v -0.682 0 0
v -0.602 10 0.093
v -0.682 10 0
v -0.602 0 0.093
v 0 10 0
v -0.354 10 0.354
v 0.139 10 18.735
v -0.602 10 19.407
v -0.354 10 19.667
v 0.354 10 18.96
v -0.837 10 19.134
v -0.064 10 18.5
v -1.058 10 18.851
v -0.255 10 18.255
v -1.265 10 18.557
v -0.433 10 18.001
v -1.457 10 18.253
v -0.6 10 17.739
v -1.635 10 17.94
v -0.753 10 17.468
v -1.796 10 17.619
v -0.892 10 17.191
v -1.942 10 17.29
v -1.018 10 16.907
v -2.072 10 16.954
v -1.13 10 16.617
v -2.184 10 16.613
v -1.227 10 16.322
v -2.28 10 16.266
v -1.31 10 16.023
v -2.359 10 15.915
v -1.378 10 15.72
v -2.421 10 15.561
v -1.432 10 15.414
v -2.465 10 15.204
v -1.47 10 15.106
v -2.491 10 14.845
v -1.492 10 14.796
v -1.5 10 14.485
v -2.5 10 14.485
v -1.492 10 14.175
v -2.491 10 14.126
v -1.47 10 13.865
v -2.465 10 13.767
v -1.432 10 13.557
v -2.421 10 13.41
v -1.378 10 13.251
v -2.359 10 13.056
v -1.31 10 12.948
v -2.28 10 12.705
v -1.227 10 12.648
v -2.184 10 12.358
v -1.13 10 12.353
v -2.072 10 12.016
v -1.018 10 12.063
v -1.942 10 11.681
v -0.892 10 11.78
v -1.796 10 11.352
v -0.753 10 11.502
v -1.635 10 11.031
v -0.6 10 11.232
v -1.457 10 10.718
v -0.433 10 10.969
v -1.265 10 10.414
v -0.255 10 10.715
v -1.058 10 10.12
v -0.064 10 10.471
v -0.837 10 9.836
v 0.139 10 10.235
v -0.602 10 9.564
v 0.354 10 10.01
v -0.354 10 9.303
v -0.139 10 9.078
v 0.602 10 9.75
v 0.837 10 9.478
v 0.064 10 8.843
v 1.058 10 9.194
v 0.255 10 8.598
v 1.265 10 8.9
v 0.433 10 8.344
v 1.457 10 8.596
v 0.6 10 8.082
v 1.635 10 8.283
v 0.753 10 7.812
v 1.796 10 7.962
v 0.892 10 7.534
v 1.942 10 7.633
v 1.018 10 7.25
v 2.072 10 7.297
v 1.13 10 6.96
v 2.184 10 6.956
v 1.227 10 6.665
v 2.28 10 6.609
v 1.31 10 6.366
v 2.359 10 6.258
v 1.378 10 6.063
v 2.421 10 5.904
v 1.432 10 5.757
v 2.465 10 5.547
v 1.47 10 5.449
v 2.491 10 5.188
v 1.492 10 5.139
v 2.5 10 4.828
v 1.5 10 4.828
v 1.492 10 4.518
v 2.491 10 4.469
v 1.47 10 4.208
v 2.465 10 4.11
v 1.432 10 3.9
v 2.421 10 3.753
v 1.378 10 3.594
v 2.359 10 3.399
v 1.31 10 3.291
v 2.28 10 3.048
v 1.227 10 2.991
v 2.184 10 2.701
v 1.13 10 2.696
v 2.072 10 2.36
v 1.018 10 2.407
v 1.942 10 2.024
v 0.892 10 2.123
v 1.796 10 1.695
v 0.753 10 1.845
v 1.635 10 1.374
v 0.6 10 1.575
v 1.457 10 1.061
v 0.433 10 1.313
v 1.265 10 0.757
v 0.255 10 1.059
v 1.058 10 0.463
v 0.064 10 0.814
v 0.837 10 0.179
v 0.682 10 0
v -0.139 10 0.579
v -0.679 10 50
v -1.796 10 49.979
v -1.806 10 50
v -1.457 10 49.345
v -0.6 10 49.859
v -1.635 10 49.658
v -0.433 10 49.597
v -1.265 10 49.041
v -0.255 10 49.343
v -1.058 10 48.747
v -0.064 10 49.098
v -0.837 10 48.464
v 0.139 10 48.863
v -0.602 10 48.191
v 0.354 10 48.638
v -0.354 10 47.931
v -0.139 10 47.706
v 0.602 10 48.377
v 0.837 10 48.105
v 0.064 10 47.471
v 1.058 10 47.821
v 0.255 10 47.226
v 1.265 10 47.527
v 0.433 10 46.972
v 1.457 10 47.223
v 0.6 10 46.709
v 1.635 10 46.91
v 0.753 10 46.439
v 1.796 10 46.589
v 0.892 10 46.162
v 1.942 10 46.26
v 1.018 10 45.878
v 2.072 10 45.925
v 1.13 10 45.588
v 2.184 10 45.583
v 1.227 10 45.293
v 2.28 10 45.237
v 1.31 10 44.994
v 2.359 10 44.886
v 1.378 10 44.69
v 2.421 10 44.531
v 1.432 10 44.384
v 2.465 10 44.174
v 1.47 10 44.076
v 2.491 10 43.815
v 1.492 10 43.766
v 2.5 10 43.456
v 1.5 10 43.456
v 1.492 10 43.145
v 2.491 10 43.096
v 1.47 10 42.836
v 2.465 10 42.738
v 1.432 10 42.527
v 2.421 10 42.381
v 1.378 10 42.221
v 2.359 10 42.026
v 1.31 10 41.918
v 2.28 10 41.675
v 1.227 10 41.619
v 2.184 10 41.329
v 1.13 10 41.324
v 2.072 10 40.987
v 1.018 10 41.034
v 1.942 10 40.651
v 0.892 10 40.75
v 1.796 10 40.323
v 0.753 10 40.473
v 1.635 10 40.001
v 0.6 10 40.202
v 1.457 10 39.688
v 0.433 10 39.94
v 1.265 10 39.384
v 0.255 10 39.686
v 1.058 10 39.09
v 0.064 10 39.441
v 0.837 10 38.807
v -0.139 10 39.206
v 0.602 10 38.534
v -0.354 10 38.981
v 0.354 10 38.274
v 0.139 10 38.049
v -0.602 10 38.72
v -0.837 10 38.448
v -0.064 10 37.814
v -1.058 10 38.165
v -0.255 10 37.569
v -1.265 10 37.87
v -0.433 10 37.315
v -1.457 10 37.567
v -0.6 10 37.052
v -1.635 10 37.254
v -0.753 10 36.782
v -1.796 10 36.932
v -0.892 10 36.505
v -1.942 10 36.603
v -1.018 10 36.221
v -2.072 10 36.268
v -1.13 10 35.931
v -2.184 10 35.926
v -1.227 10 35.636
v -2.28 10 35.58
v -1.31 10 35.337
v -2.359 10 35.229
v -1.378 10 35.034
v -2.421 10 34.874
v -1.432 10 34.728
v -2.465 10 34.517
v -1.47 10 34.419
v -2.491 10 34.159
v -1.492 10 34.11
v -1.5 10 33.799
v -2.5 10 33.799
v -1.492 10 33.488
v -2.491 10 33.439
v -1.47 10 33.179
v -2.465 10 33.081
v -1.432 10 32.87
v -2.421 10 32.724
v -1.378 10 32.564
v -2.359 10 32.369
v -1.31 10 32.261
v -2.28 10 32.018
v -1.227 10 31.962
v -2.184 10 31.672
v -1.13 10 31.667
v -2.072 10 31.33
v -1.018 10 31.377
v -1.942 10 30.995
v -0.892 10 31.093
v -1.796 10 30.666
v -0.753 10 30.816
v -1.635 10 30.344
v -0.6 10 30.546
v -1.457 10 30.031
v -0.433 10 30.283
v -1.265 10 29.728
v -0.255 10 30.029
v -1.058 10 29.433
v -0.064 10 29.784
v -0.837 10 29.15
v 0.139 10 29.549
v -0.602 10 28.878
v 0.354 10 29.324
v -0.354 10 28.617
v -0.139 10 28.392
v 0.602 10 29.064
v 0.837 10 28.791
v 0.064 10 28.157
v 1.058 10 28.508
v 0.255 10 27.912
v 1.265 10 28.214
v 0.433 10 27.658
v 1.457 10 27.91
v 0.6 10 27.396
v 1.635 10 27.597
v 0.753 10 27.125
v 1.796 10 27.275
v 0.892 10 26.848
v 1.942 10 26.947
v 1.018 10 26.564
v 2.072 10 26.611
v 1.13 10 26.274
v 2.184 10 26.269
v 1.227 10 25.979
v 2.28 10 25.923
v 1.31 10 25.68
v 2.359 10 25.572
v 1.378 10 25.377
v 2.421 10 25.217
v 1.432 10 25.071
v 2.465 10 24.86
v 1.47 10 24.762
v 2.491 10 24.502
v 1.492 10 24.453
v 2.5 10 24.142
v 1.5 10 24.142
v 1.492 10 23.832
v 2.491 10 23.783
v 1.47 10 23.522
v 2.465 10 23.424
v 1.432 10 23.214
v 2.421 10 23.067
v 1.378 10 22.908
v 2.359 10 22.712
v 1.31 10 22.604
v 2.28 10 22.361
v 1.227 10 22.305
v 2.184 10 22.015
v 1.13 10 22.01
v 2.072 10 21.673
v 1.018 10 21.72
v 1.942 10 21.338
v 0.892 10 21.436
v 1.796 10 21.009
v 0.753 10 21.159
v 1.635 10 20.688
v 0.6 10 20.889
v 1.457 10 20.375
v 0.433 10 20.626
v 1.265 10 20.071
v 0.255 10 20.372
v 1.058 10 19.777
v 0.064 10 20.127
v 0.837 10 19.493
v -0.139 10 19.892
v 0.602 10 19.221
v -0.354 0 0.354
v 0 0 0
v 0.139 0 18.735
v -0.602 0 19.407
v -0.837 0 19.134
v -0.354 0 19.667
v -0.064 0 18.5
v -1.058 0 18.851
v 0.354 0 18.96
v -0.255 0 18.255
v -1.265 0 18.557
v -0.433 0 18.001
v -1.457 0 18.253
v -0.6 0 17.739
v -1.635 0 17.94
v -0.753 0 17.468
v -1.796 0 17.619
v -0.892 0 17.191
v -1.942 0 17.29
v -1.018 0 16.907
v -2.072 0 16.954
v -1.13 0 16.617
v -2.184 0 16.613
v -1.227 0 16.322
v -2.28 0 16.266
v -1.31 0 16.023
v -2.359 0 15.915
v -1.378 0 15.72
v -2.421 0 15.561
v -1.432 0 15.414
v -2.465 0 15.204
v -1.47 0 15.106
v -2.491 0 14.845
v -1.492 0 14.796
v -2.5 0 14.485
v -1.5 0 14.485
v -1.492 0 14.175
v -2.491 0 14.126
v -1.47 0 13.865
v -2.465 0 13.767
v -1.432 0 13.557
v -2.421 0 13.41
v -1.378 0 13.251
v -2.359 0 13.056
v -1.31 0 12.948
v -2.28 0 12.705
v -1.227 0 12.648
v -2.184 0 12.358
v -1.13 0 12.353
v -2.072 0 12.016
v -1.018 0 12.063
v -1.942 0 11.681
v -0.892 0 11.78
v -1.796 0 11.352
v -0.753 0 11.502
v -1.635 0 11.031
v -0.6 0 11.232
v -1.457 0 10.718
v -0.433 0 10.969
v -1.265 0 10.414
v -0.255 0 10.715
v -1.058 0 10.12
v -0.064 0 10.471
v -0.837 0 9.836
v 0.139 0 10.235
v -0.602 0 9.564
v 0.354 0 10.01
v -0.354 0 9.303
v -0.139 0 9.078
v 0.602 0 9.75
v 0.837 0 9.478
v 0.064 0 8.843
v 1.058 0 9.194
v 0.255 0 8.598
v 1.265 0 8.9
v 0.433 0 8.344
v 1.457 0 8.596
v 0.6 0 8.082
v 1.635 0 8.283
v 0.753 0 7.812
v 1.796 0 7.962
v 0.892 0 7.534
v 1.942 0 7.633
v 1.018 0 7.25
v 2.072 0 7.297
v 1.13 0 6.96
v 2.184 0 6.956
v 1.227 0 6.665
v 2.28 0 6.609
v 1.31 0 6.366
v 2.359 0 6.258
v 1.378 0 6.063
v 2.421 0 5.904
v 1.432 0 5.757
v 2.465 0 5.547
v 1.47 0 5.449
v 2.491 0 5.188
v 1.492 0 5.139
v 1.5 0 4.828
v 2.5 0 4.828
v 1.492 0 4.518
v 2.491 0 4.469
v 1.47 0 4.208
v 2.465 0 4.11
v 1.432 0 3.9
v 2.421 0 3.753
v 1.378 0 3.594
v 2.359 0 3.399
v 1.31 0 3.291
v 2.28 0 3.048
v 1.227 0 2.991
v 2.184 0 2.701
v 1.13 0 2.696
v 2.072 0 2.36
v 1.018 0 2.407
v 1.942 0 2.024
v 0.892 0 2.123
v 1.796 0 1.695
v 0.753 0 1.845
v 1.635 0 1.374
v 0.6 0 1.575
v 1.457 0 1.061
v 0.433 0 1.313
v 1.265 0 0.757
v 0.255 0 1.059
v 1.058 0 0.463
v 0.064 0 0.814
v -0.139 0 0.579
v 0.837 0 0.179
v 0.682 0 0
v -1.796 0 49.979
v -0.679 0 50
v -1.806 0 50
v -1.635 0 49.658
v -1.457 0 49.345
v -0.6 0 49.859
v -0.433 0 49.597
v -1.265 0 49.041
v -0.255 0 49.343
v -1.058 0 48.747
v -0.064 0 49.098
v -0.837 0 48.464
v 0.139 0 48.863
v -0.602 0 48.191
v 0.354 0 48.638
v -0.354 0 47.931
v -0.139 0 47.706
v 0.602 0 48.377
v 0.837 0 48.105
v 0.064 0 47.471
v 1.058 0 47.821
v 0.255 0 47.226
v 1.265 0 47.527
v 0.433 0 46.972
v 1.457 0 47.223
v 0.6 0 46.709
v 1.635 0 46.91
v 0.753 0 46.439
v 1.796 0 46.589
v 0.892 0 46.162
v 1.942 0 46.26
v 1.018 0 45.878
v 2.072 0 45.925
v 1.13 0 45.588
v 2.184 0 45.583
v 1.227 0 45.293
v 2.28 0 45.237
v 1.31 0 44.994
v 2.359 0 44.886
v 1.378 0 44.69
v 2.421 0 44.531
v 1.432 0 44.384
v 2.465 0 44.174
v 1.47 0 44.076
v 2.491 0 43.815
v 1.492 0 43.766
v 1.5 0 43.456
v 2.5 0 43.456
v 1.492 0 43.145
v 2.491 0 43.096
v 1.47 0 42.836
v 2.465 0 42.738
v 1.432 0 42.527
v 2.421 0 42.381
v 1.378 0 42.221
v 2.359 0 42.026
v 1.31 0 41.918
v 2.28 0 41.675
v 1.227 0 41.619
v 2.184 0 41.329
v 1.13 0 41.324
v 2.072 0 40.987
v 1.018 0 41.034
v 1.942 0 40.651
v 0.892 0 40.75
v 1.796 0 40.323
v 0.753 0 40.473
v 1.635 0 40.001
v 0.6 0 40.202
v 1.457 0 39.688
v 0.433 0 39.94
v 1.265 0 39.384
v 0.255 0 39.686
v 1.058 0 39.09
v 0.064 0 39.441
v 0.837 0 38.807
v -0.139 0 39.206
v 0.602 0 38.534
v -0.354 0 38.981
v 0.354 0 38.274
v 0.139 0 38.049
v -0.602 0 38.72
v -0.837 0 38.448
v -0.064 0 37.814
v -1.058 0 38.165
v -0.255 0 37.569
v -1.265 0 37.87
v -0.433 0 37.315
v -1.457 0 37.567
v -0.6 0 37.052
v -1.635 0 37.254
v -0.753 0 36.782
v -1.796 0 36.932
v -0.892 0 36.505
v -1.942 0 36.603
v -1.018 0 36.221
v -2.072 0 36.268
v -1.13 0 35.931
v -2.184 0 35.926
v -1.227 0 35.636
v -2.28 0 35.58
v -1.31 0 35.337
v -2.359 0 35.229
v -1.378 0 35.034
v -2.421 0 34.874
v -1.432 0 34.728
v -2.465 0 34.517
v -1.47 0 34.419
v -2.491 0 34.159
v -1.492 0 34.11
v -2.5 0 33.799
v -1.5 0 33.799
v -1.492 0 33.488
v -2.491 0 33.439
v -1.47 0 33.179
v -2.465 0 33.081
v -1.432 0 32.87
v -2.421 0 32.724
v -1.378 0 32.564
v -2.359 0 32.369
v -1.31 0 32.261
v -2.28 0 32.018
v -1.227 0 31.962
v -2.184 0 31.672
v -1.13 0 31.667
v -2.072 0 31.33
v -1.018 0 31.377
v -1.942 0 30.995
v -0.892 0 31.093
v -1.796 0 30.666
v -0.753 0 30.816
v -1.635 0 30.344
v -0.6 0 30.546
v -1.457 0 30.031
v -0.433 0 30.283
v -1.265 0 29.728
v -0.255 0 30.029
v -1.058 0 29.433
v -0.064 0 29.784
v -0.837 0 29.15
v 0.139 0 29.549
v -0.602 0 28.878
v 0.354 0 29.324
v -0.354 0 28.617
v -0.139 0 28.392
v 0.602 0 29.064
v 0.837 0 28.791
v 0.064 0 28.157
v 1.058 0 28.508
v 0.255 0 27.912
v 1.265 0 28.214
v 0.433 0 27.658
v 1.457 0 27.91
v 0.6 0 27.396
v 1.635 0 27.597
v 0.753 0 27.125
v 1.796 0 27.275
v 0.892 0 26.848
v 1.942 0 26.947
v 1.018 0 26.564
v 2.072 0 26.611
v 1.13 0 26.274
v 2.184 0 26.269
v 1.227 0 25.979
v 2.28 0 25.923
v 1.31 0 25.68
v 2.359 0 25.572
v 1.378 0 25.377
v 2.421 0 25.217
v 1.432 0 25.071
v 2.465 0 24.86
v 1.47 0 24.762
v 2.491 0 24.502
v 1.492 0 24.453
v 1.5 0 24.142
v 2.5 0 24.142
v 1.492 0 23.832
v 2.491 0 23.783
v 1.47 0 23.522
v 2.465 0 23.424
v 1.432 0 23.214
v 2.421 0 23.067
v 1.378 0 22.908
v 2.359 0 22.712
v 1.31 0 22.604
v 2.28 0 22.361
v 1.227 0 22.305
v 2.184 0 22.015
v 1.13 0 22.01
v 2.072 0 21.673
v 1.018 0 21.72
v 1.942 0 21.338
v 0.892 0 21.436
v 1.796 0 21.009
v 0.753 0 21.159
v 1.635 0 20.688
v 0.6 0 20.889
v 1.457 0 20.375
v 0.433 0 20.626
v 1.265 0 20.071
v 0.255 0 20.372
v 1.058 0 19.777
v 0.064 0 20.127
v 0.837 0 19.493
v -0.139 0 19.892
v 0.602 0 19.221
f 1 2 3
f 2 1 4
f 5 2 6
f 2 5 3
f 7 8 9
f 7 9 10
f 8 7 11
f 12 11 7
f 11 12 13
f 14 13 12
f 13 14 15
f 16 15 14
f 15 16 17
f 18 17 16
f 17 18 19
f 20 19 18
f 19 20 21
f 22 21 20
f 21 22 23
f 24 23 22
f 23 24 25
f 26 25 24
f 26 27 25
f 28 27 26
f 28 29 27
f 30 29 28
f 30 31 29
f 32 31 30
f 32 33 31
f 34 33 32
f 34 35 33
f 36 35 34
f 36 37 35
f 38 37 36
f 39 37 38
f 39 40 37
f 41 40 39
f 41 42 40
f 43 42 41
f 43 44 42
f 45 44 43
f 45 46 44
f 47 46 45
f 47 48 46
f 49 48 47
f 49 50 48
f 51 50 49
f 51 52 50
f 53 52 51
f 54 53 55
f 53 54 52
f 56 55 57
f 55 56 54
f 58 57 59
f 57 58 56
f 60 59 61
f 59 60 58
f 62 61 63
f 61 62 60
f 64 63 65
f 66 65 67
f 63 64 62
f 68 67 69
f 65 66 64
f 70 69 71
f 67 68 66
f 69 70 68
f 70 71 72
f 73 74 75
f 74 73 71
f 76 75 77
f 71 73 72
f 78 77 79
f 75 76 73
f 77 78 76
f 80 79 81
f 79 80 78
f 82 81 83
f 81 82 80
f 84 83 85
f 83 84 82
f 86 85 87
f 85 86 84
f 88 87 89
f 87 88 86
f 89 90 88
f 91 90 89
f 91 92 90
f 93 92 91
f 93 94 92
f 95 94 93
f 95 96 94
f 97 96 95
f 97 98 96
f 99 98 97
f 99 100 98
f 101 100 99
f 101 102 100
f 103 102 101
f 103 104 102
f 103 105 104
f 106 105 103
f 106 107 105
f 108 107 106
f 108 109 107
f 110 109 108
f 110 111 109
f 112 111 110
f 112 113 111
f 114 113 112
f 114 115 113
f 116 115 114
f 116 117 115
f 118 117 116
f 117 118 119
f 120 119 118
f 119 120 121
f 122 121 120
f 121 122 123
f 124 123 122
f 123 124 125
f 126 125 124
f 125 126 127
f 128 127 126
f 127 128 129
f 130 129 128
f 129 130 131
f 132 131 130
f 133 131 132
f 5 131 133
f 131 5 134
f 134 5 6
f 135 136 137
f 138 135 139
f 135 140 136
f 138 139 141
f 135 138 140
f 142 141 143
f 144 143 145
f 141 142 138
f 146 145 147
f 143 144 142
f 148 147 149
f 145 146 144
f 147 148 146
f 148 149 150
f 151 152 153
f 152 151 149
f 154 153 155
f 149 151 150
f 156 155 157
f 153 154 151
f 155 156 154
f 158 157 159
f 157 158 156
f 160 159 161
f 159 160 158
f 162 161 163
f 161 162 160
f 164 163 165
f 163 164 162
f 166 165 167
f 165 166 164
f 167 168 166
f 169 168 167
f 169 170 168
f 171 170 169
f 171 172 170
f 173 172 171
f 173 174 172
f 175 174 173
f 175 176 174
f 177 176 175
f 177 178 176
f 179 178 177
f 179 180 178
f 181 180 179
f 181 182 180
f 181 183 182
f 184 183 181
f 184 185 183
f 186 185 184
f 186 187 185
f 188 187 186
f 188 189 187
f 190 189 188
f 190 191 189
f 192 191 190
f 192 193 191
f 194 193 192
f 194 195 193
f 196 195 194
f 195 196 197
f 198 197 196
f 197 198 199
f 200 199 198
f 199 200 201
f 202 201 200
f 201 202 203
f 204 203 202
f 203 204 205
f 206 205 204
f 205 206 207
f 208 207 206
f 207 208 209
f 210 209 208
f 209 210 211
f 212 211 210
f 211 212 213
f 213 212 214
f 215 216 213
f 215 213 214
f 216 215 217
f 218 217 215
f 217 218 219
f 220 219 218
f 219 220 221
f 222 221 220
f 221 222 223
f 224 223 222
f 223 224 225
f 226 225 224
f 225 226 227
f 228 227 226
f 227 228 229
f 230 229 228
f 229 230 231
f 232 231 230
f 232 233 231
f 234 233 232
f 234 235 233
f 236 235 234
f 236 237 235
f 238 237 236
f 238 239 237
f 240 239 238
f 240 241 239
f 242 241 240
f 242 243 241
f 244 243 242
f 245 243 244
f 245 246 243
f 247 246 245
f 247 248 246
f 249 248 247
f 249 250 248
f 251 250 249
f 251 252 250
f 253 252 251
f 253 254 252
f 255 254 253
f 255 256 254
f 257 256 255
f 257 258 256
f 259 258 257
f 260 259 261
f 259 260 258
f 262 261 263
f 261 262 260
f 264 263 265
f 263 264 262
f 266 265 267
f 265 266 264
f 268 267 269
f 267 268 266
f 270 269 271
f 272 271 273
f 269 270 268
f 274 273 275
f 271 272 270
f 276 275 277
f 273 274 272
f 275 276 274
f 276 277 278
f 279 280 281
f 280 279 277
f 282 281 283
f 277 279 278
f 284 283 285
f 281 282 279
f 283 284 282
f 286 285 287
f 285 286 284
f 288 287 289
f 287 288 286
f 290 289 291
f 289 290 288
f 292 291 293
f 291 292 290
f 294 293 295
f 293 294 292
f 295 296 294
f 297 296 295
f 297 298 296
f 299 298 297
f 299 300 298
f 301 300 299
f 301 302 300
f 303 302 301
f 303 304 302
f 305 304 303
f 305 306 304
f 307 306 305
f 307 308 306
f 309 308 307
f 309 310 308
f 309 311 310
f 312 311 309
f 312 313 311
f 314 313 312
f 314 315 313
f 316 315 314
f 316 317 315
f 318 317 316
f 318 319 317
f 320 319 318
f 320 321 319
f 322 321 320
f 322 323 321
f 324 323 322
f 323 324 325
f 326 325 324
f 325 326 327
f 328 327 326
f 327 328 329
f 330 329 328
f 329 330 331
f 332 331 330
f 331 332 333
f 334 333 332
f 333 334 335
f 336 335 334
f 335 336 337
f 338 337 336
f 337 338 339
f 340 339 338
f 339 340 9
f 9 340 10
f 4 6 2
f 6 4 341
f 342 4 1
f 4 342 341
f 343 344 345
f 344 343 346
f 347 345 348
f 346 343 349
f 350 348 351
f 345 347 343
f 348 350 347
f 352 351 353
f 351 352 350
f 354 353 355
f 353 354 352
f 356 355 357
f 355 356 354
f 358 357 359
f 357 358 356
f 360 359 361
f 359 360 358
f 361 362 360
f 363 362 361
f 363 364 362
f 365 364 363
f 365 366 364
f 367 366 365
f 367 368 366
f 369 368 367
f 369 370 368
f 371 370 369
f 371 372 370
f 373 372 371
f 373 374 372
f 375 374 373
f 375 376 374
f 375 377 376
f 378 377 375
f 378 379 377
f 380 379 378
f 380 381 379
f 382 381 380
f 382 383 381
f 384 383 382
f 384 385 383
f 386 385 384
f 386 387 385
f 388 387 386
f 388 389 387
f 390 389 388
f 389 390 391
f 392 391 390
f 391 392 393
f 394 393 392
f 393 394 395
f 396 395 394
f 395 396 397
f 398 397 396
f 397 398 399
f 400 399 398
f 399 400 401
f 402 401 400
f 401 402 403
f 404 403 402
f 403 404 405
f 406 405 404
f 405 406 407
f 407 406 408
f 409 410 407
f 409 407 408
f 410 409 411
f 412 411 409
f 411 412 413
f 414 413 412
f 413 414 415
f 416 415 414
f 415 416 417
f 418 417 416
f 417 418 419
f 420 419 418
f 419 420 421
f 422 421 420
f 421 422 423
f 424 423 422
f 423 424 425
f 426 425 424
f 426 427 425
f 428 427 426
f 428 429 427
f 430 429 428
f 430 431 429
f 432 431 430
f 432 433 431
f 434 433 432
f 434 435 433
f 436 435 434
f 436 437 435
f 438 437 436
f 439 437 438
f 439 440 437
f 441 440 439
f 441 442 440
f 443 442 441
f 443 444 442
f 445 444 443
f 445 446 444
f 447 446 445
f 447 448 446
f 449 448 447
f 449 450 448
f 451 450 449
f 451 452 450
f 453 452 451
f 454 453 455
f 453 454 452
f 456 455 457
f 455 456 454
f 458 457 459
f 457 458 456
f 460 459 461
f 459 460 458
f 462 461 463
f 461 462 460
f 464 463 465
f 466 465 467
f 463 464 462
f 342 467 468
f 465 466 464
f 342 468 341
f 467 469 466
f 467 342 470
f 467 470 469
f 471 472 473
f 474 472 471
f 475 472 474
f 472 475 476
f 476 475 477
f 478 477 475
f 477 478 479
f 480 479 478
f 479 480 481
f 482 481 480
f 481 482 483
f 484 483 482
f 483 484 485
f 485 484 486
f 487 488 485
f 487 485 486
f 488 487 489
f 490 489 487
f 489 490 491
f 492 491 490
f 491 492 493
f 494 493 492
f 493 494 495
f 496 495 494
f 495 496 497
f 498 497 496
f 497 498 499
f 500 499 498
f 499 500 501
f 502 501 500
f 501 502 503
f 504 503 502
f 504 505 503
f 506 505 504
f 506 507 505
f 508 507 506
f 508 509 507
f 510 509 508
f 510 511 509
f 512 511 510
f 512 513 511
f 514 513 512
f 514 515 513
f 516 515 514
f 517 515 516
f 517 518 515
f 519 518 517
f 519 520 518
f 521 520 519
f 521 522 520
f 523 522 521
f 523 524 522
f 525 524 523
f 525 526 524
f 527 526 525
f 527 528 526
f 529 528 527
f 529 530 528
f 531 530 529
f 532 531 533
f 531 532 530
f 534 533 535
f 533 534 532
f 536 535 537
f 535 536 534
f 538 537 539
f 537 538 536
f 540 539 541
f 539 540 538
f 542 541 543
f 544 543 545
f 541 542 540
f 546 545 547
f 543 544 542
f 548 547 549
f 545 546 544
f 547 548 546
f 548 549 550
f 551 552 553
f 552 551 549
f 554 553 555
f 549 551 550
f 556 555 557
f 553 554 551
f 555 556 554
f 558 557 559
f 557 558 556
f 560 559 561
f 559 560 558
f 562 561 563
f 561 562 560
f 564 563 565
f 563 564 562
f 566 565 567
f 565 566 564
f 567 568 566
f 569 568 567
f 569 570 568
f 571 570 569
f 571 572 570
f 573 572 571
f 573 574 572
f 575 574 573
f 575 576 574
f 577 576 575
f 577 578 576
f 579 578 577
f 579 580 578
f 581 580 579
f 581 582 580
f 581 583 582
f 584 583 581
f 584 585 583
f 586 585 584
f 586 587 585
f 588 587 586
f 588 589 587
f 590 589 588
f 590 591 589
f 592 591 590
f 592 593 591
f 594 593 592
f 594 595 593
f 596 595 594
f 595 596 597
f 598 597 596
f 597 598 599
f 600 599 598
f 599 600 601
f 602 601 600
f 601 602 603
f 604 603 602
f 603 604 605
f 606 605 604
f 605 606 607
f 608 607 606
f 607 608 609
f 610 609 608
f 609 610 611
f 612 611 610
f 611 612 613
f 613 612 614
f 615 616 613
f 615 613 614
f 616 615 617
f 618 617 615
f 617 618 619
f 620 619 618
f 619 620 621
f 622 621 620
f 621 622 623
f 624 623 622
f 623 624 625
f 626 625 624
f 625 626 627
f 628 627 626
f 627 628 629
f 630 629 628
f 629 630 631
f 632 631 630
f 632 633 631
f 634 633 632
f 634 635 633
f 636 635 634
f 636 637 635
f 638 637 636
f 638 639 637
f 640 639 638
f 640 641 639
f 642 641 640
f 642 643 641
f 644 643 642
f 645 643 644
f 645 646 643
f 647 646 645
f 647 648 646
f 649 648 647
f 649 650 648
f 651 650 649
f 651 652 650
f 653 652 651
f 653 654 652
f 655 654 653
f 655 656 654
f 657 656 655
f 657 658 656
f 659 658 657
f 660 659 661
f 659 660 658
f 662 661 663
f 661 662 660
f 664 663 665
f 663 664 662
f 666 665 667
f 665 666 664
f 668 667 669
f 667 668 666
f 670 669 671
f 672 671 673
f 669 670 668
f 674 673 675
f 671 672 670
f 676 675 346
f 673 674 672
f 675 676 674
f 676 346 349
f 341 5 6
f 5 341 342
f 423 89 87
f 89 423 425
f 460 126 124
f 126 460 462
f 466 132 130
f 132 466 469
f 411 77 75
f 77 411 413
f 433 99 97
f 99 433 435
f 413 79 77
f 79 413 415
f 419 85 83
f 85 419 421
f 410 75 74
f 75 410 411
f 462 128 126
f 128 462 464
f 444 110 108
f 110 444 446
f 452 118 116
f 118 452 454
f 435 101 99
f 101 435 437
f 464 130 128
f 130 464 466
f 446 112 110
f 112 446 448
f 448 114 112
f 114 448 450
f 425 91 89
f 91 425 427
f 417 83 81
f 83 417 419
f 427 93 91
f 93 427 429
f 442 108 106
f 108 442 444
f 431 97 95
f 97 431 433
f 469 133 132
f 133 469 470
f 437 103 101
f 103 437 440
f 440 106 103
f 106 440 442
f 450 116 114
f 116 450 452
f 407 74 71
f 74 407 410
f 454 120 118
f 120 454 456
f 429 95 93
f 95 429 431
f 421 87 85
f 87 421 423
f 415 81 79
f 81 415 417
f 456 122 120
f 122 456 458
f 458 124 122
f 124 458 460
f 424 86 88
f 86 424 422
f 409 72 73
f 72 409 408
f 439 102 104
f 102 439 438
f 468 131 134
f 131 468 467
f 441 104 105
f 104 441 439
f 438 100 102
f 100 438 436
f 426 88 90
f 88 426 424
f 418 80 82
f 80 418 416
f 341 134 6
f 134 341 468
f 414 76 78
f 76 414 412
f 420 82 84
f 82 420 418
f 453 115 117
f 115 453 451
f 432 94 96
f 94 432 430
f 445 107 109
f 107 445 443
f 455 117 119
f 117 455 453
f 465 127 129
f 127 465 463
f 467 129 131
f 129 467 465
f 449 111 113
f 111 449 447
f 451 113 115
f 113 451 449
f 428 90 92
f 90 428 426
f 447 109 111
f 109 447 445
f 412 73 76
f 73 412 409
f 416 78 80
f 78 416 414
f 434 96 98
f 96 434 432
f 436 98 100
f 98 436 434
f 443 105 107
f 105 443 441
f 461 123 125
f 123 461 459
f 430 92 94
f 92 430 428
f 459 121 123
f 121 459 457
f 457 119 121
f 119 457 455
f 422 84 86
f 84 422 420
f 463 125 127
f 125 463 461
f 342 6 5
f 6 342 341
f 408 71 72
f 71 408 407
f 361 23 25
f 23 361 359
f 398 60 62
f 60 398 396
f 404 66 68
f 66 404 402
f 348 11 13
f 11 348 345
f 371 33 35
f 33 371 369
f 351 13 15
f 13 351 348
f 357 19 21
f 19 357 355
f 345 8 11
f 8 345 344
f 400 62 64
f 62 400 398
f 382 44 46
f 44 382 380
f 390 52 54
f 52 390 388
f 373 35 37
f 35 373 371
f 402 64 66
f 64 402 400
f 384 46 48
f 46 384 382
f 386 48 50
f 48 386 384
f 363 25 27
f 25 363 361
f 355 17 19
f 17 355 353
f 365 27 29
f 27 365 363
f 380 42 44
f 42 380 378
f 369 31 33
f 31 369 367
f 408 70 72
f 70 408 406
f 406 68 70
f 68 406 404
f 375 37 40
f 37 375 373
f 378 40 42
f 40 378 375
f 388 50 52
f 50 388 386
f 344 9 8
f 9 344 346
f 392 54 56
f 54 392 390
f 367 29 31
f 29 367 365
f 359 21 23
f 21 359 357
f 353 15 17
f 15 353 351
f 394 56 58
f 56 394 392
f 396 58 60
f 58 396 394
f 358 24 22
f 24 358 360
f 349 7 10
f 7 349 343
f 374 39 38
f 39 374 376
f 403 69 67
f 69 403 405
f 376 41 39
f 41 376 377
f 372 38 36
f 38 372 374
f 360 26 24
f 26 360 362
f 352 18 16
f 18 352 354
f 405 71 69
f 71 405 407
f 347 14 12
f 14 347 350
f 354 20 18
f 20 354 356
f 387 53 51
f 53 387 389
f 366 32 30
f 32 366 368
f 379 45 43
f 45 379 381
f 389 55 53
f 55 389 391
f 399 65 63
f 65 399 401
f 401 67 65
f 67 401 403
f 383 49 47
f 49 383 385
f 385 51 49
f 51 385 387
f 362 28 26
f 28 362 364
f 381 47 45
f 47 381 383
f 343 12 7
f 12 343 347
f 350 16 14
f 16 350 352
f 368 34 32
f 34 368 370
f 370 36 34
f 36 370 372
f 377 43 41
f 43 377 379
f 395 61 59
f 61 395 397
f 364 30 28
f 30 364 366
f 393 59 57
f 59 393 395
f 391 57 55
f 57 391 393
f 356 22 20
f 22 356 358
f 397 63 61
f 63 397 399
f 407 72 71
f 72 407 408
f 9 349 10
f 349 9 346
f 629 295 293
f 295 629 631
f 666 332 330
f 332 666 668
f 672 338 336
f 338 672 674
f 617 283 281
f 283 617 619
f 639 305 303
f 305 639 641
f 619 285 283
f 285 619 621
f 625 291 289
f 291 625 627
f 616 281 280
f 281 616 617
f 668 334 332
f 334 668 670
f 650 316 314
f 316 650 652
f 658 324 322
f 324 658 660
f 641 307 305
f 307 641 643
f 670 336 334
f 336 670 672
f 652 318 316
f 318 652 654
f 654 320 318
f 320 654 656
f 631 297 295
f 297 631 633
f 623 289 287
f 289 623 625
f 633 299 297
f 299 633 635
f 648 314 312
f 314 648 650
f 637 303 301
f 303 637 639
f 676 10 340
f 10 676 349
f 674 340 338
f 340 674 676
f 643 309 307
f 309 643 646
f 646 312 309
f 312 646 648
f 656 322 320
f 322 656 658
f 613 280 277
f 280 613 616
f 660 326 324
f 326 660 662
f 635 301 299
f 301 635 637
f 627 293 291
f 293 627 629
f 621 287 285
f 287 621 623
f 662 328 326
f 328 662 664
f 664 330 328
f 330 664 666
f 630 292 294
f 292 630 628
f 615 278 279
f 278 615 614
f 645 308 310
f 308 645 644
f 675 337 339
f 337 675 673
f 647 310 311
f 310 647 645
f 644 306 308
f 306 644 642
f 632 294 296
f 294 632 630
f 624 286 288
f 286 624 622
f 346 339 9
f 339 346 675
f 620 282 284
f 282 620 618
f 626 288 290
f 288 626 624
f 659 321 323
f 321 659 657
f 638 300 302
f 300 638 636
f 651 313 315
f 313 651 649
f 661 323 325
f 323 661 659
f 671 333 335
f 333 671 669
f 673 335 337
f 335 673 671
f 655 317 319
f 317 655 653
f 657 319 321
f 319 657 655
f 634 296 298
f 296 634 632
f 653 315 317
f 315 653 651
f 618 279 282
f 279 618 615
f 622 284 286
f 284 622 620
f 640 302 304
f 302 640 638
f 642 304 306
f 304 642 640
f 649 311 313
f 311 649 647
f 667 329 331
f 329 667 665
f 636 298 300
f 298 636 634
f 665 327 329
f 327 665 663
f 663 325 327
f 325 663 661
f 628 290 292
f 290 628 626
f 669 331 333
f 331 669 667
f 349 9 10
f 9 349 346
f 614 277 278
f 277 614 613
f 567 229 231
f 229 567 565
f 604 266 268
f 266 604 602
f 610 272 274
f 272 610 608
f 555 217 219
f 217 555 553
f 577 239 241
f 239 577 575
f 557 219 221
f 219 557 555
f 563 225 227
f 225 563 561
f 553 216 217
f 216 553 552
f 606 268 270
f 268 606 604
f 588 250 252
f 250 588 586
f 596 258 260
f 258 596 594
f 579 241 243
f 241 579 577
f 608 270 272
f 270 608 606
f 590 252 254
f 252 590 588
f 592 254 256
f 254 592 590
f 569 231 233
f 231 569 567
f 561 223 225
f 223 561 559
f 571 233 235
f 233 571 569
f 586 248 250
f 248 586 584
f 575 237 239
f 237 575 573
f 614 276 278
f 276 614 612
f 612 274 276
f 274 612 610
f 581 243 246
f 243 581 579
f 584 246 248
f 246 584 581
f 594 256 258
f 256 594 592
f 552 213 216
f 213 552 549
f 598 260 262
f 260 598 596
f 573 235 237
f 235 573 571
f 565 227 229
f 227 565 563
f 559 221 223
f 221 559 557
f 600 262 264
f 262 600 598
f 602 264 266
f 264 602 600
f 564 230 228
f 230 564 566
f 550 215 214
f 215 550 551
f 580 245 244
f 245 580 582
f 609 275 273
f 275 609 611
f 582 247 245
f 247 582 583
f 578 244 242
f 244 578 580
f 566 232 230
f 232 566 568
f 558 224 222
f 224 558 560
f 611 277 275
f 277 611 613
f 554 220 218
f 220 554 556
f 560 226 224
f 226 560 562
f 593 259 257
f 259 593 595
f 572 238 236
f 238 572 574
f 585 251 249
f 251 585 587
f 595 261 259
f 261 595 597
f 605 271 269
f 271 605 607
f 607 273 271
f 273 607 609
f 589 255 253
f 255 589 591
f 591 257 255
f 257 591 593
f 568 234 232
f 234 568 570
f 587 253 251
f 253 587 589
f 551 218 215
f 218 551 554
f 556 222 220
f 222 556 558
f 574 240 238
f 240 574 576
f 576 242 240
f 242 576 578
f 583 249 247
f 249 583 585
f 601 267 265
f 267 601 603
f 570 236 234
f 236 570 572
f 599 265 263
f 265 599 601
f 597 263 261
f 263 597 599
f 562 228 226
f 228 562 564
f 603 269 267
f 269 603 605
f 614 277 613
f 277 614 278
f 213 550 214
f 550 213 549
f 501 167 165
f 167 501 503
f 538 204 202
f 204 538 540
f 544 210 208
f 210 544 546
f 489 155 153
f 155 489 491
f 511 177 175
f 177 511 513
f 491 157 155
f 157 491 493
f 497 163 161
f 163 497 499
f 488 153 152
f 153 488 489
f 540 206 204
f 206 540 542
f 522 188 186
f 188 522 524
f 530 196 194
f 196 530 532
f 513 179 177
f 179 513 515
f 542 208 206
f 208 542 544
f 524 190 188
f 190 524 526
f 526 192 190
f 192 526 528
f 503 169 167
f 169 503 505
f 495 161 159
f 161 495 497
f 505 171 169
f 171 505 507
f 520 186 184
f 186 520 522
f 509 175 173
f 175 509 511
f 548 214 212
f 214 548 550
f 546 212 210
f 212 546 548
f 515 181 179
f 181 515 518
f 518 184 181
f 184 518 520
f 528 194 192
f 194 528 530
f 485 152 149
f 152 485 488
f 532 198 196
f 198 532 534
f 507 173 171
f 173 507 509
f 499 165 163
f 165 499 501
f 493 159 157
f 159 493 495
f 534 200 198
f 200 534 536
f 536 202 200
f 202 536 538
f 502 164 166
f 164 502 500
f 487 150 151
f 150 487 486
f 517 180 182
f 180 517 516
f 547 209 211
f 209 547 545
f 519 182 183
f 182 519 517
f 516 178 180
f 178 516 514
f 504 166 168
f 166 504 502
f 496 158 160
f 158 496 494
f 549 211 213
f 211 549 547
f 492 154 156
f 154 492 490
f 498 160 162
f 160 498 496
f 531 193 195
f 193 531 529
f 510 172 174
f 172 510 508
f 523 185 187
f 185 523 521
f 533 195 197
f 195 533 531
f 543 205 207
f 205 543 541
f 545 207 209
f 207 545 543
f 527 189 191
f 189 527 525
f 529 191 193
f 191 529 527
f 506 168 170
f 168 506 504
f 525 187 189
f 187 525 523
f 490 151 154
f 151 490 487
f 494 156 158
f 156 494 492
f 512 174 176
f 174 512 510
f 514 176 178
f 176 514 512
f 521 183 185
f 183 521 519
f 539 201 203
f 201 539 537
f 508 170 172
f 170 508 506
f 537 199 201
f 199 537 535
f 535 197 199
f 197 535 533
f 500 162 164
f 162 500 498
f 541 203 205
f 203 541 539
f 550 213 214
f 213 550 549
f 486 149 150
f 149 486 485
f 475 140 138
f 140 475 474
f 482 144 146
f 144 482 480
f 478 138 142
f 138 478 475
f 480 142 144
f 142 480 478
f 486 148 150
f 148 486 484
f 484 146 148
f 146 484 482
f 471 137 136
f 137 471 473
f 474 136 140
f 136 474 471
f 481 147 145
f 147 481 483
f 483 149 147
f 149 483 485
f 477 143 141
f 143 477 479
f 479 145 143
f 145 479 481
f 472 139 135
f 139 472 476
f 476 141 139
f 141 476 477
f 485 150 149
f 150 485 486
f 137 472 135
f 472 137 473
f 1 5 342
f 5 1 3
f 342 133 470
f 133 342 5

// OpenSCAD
$fn=128;

wall=1;
width=5;
thick=10;
height=50;
angle=45;

a=90-angle;
r=(width/2-sin(a)*wall/2)/(1-sin(a));

xCut=sin(a)*(r-wall/2);
//z2=(r-wall/2)*sin(a);
z3=sqrt(sqr(r)-sqr(xCut)); ///inner
z4=sqrt(sqr(r-wall)-sqr(xCut)); ///outter
z5=sqrt(sqr(r-wall/2)-sqr(xCut)); ///middle

not=0.01;

/////////////////////////////////////////////////

intersection(){
	for(z=[-2*z5:2*(2*z5):height]){
		t([0,0,z]) turn();
		t([0,0,z+2*z5]) mirror([1,0,0]) turn();
	}
	
	t([-2*r,0,0]) cube([4*r,thick,height]);
	
}

/////////////////////////////////////////////////

module turn(){	
	difference(){
		tr([xCut,0,z5],[-90,0,0]) difference(){
			cylinder(r=r,h=thick);
			t([0,0,-not]) cylinder(r=r-wall,h=thick+2*not);
		}
		
		rt([0,a,0],[0,0,0],[0,-not,-2*r]) cube([2*r,thick+2*not,4*r]);
		rt([0,-a,0],[0,0,2*z5],[0,-not,-2*r]) cube([2*r,thick+2*not,4*r]);
	}
}

function sqr(a) = ((a)*(a));
module t(v=[0,0,0]){translate(v) children();}
module r(a=[0,0,0],rp=[0,0,0]){translate(rp) rotate(a) translate(-rp) children();}
module tr(v=[0,0,0],a=[0,0,0],rp=[0,0,0]){t(v) r(a,rp) children();}
module rt(a=[0,0,0],rp=[0,0,0],v=[0,0,0]){r(a,rp) t(v) children();}
module u(){union() children();}
